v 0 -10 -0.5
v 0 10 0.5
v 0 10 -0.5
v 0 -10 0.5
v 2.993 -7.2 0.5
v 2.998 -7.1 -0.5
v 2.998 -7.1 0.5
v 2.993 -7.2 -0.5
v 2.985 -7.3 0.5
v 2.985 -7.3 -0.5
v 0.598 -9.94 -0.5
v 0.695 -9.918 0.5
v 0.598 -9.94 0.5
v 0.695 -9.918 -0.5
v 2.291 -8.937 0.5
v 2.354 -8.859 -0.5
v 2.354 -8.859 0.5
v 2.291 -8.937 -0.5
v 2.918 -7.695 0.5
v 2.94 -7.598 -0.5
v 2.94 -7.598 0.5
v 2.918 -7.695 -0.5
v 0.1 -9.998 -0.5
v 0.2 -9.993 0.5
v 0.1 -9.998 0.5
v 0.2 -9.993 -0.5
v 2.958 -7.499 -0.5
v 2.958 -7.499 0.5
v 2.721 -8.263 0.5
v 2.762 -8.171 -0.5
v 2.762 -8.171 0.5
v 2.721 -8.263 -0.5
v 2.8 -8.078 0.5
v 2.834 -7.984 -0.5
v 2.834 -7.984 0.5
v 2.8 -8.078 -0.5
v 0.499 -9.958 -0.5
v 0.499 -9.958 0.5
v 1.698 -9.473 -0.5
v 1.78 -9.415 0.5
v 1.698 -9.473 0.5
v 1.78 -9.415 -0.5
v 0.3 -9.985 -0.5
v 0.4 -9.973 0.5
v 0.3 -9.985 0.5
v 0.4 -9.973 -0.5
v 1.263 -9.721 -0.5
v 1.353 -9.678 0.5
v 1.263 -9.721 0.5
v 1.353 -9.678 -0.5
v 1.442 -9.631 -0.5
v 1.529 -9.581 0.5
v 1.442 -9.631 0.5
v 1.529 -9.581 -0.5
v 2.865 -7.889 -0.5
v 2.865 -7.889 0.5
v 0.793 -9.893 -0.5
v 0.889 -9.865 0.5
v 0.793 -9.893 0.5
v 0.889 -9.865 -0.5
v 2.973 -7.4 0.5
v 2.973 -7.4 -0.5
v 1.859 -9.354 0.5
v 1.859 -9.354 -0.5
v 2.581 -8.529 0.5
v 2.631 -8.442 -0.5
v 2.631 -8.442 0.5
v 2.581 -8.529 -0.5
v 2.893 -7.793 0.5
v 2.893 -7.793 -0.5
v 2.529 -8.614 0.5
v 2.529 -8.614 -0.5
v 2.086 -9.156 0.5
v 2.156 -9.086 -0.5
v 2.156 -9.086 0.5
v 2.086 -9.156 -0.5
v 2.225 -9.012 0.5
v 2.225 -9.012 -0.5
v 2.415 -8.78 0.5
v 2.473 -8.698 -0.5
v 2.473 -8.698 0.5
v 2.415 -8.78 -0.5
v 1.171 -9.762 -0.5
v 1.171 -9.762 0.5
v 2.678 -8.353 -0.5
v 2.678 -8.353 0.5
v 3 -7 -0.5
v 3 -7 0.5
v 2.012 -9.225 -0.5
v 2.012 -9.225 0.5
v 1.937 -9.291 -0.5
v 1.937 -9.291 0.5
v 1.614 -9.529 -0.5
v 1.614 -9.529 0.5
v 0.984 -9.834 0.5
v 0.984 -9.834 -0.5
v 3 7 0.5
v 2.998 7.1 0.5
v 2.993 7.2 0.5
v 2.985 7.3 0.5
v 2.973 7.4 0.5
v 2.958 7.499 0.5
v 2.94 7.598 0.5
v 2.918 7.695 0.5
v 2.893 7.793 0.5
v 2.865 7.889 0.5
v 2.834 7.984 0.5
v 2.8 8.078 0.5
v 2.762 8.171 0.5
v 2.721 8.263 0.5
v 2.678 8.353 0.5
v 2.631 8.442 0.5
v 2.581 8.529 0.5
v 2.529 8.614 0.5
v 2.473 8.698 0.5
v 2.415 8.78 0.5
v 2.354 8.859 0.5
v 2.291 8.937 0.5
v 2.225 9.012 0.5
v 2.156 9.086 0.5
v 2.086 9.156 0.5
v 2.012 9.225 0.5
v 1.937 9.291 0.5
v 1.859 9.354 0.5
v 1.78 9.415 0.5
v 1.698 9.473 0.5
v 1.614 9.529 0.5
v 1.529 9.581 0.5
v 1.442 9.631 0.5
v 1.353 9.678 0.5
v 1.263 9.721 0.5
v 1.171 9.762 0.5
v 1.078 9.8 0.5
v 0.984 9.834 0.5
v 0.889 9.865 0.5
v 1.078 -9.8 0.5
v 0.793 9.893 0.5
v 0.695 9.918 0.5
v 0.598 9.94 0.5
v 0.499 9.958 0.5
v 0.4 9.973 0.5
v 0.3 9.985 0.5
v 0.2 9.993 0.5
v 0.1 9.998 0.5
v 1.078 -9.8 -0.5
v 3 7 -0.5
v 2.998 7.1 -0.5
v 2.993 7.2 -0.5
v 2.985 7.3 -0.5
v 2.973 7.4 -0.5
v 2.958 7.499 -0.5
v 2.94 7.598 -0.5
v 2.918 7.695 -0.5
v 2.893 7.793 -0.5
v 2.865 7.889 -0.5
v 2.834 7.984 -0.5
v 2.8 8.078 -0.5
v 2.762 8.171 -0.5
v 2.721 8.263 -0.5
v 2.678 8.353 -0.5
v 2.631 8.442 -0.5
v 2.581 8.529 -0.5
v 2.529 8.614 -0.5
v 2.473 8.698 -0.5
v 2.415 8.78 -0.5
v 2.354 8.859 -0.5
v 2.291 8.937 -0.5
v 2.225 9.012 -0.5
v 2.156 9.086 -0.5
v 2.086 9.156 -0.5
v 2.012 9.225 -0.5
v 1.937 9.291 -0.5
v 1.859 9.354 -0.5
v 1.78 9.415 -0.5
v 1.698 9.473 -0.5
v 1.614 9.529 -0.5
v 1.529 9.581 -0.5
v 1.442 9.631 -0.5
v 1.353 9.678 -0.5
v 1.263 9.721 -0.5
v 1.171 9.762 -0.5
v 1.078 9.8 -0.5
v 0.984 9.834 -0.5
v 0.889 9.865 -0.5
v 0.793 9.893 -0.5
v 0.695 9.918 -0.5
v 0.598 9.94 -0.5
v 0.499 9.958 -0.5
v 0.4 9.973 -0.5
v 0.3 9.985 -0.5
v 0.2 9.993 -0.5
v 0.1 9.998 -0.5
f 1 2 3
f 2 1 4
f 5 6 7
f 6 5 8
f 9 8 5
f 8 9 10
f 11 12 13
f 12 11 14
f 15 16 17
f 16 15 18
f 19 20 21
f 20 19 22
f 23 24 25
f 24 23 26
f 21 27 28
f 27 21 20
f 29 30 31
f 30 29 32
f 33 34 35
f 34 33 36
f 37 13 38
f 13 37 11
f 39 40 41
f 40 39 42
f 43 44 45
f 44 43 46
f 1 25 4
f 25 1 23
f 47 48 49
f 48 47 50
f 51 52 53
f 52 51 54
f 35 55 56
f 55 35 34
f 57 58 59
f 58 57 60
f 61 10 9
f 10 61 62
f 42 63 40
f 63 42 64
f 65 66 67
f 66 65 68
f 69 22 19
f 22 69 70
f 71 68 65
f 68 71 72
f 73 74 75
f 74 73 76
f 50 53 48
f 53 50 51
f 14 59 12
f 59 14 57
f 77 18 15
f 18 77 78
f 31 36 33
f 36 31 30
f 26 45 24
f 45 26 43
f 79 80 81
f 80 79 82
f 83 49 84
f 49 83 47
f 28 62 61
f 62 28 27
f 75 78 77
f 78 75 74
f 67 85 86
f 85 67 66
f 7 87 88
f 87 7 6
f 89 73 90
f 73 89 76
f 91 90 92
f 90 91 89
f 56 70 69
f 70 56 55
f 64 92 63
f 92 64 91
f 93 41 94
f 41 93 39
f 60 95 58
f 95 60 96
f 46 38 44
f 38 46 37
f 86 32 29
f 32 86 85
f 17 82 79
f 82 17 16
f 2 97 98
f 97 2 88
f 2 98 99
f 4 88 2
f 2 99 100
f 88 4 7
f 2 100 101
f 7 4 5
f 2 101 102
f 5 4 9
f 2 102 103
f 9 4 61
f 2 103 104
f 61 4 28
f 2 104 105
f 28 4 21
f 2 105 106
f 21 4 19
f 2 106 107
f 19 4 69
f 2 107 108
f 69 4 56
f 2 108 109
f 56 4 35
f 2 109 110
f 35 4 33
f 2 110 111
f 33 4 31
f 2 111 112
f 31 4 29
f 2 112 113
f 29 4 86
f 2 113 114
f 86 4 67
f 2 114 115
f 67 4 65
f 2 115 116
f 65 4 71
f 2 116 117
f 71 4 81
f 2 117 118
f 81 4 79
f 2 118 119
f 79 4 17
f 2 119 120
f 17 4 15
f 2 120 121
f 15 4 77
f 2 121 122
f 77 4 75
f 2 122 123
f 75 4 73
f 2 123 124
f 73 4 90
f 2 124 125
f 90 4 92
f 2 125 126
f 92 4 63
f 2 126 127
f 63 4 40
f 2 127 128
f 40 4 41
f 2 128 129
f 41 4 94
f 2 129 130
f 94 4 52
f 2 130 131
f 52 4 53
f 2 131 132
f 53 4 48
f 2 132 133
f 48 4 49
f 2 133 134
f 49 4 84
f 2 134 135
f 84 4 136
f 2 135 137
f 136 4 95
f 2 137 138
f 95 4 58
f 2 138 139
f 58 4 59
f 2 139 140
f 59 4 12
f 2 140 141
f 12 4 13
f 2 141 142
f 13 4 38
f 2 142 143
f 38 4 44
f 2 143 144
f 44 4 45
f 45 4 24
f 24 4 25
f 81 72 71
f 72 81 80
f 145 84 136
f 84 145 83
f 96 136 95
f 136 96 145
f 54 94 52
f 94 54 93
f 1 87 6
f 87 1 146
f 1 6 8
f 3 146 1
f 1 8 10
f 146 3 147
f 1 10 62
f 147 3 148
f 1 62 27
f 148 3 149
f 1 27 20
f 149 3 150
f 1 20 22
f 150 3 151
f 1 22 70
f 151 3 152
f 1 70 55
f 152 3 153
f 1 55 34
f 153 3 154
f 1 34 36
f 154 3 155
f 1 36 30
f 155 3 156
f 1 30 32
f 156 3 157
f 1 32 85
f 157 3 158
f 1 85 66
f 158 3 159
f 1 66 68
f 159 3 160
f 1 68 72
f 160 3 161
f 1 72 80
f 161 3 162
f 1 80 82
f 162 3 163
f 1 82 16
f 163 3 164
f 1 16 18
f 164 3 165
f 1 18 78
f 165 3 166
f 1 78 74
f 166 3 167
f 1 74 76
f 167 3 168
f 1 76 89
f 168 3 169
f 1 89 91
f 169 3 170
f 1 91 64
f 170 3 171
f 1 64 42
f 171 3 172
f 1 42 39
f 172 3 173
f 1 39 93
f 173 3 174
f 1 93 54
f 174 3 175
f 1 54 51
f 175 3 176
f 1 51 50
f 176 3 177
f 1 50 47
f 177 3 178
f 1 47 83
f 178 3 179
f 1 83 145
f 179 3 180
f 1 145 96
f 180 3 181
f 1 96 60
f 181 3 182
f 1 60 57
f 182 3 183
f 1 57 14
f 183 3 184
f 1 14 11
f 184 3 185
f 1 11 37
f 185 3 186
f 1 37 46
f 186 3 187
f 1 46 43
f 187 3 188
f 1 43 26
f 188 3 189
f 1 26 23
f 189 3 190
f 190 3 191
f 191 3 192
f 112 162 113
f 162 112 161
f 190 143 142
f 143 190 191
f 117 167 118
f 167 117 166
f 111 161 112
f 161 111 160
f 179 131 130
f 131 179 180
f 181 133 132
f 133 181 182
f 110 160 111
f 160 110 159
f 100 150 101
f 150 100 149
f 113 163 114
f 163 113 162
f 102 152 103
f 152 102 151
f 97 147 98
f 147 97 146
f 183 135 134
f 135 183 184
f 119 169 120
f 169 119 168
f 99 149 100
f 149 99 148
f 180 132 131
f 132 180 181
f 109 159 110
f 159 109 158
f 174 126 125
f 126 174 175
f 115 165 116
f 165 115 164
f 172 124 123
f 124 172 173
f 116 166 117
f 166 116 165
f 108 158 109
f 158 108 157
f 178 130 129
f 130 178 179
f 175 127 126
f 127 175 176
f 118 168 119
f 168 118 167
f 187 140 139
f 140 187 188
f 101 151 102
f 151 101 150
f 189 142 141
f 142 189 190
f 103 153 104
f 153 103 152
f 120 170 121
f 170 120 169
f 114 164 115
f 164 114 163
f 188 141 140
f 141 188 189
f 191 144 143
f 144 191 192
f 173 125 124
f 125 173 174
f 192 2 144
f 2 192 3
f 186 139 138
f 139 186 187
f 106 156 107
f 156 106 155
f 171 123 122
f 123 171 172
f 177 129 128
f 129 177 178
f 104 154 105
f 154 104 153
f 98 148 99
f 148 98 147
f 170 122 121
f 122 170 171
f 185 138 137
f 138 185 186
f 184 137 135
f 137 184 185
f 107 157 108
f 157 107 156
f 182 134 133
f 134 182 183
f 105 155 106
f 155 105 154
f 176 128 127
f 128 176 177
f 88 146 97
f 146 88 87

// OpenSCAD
// file: functions.scad
/////////////////////////////////////////////////////////////////////////////////////////////////////////////////////////
// Auto generate a rectangle with rounded edges and corners
/////////////////////////////////////////////////////////////////////////////////////////////////////////////////////////
module rect_round(length,width,depth,rad) {
    
    // long sides
    l1 = length - 2*rad;
      
    // wide sides
    w1 = width - 2*rad;
    
    // deep sides
    d1 = depth - 2 * rad;
    
    // central rect l1 x w1 x d1
    
    union() {
        // corner spheres - locations defined by l1 w1 d1
        for ( i = [-1,1] ) {
            for ( j = [-1,1] ) {
                for ( k = [-1,1] ) {
                    //spheres
                    translate([i*(l1/2),j*(w1/2),k*(d1/2)]){
                        sphere(r = rad, center = true);                        
                        }  
                    }
                }
            }
        
        // face rectangles
        for ( i = [-1,1] ) {
            
            //x
            translate([i*(l1+rad)/2,0,0]){
                cube([rad,w1,d1],center=true); 
                }
            //y
            translate([0,i*(w1+rad)/2,0]){
                cube([l1,rad,d1],center=true); 
                }
            //z
            translate([0,0,i*(d1+rad)/2]){
                cube([l1,w1,rad],center=true); 
                }
            }
         // edge cylinders       
         for ( i = [-1,1] ) {
             for ( j = [-1,1] ){
            // short
            translate([i*(l1/2),j*(w1/2),0]){
                cylinder(h=d1 ,r=rad, center=true); 
                }
            // mid
            translate([i*(l1/2),0,j*(d1/2)]){
                rotate(a=90,v=[1,0,0]){
                    cylinder(h=w1 ,r=rad, center=true);
                    }
                }
            // long
            translate([0,i*(w1/2),j*(d1/2)]){
                rotate(a=90,v=[0,1,0]){
                    cylinder(h=l1 ,r=rad, center=true);
                    }
                }
            }
            }  
            // central cube
            cube([l1,w1,d1],center=true);
        }
    }
//////////////////////////////////////////////////////////////////////////////////////////////////////////////////

//////////////////////////////////////////////////////////////////////////////////////////////////////////////////
// Auto generate cutouts for nuts, where length is the distance b/w parallel sides and thickness is the nut thickness or cutout depth
/////////////////////////////////////////////////////////////////////////////////////////////////////////////////////////
module hex_nut_cutout(length, thickness) {



   
   hex_side_length = length / sqrt(3);

   union(){
      cube([hex_side_length,thickness,length], center=true);
      rotate([0,60,0]){cube([hex_side_length,thickness,length], center=true);}
      rotate([0,120,0]){cube([hex_side_length,thickness,length], center=true);}
   }
}
/////////////////////////////////////////////////////////////////////////////////////////////////////////////////////////

/////////////////////////////////////////////////////////////////////////////////////////////////////////////////////////
// Auto generate a spherical section with a flat face, where radius is the radius  of the sphere, and fraction is the of the diameter required
/////////////////////////////////////////////////////////////////////////////////////////////////////////////////////////
module  sphere_fraction(radius, fraction) {

difference() {
   
   sphere( r=radius, center=true);

   translate( [ 0, 0, -(fraction)*radius]){ cube([ 2.01*radius, 2.01*radius, 2.001*(1-fraction)*radius], center=true);}

}
}
/////////////////////////////////////////////////////////////////////////////////////////////////////////////////////////

/////////////////////////////////////////////////////////////////////////////////////////////////////////////////////////
// Gear Generator
/////////////////////////////////////////////////////////////////////////////////////////////////////////////////////////

module gear_generator( number_of_teeth, pitch, thickness, pivot ){

// Calculated
P = PI / pitch;
diameter = number_of_teeth/P;


a = 1/P;
b = 1.25/P;
ht = 2.25/P;
c = 0.25/P;
rf = 0.30/P;
Db = diameter*cos(20);
Do = (number_of_teeth+2)/P;
Dr = (number_of_teeth-2.5)/P;
t = 1.5708/P;
r = diameter/2;
h = diameter-Db;

l = 0.5*Db - 0.5*diameter*sin(360/(4*number_of_teeth));
//l = 0.5*Db -t/2;

echo(diameter,a,b,ht,c,rf,Db/2,Do,Dr,t,r,h,l);

// Bevel the edges
run = 0.5*(Do-diameter);
rise = 0.364*run;
bulk = thickness - 2*rise;
disp = thickness/2 - 0.5*rise;

echo(run, rise, bulk, disp);


difference(){
intersection(){
//envelope
union(){
translate([0,0, disp]){cylinder(r1 = Do/2, r2 = Do/2-run, h=rise,center=true); }
cylinder(r = Do/2, h=bulk, center=true);
translate([0,0,-disp]){cylinder(r1 = Do/2-run, r2 = Do/2, h=rise,center=true); }
}

//union(){
//translate([0,0,(1/2)*thickness]){cylinder(r1 =  }
//cylinder(r = Do/2, h=(2/3)*thickness, center=true);
//}

union(){
cylinder(r = Dr/2, h=thickness, center=true);
for(i=[1:number_of_teeth]){

angle = (i-1)*360/number_of_teeth;

rotate( [ 0, 0, angle] ){
   translate( [ 0.5*Db, 0, 0] ) {
         intersection() {
         translate([0,l,0]){cylinder( r = 0.5*Db, h=thickness, center=true);}
         translate([0,-l,0]){cylinder( r = 0.5*Db, h=thickness, center=true);}
         }
      }
   }
}
}
}

cylinder(r=pivot, h=thickness+1, center=true);
}
}
/////////////////////////////////////////////////////////////////////////////////////////////////////////////////////////

/////////////////////////////////////////////////////////////////////////////////////////////////////////////////////////
// Rounded Edges for Extrusions
/////////////////////////////////////////////////////////////////////////////////////////////////////////////////////////

module round_edge_extrusion( cor_rad, tot_dep) {

dep = tot_dep - 2*cor_rad;
offset = 0.5*dep;


// shape to be extruded
union() {
// radius
for( i=[0,1]) {

translate( [ 0, cos(180*i)*offset, 0] ) {
rotate_extrude( angle = 90-i*180 ) {
translate( [ cor_rad-0.5*cor_rad, 0, 0] ) {square( [cor_rad, 1], center=true);}
}
}
}

translate( [ cor_rad-0.5*cor_rad, 0, 0] ) {cube([ cor_rad, dep, 1], center=true);}

}
}
/////////////////////////////////////////////////////////////////////////////////////////////////////////////////////////
// main file
use <functions.scad>

  $fa=.1; // default minimum facet angle is now 0.5
  $fs=.1; // default minimum facet size is now 0.5 mm


r=3;
l=14;

// shape to be extruded
union() {
// radius
for( i=[0,1]) {

translate( [ 0, i*l-0.5*l, 0] ) {
rotate_extrude( angle = -90+i*180 ) {
translate( [ r-0.5*r, 0, 0] ) {square( [r, 1], center=true);}
}
}
}

translate( [ r-0.5*r, 0, 0] ) {cube([ r, l, 1], center=true);}

}
